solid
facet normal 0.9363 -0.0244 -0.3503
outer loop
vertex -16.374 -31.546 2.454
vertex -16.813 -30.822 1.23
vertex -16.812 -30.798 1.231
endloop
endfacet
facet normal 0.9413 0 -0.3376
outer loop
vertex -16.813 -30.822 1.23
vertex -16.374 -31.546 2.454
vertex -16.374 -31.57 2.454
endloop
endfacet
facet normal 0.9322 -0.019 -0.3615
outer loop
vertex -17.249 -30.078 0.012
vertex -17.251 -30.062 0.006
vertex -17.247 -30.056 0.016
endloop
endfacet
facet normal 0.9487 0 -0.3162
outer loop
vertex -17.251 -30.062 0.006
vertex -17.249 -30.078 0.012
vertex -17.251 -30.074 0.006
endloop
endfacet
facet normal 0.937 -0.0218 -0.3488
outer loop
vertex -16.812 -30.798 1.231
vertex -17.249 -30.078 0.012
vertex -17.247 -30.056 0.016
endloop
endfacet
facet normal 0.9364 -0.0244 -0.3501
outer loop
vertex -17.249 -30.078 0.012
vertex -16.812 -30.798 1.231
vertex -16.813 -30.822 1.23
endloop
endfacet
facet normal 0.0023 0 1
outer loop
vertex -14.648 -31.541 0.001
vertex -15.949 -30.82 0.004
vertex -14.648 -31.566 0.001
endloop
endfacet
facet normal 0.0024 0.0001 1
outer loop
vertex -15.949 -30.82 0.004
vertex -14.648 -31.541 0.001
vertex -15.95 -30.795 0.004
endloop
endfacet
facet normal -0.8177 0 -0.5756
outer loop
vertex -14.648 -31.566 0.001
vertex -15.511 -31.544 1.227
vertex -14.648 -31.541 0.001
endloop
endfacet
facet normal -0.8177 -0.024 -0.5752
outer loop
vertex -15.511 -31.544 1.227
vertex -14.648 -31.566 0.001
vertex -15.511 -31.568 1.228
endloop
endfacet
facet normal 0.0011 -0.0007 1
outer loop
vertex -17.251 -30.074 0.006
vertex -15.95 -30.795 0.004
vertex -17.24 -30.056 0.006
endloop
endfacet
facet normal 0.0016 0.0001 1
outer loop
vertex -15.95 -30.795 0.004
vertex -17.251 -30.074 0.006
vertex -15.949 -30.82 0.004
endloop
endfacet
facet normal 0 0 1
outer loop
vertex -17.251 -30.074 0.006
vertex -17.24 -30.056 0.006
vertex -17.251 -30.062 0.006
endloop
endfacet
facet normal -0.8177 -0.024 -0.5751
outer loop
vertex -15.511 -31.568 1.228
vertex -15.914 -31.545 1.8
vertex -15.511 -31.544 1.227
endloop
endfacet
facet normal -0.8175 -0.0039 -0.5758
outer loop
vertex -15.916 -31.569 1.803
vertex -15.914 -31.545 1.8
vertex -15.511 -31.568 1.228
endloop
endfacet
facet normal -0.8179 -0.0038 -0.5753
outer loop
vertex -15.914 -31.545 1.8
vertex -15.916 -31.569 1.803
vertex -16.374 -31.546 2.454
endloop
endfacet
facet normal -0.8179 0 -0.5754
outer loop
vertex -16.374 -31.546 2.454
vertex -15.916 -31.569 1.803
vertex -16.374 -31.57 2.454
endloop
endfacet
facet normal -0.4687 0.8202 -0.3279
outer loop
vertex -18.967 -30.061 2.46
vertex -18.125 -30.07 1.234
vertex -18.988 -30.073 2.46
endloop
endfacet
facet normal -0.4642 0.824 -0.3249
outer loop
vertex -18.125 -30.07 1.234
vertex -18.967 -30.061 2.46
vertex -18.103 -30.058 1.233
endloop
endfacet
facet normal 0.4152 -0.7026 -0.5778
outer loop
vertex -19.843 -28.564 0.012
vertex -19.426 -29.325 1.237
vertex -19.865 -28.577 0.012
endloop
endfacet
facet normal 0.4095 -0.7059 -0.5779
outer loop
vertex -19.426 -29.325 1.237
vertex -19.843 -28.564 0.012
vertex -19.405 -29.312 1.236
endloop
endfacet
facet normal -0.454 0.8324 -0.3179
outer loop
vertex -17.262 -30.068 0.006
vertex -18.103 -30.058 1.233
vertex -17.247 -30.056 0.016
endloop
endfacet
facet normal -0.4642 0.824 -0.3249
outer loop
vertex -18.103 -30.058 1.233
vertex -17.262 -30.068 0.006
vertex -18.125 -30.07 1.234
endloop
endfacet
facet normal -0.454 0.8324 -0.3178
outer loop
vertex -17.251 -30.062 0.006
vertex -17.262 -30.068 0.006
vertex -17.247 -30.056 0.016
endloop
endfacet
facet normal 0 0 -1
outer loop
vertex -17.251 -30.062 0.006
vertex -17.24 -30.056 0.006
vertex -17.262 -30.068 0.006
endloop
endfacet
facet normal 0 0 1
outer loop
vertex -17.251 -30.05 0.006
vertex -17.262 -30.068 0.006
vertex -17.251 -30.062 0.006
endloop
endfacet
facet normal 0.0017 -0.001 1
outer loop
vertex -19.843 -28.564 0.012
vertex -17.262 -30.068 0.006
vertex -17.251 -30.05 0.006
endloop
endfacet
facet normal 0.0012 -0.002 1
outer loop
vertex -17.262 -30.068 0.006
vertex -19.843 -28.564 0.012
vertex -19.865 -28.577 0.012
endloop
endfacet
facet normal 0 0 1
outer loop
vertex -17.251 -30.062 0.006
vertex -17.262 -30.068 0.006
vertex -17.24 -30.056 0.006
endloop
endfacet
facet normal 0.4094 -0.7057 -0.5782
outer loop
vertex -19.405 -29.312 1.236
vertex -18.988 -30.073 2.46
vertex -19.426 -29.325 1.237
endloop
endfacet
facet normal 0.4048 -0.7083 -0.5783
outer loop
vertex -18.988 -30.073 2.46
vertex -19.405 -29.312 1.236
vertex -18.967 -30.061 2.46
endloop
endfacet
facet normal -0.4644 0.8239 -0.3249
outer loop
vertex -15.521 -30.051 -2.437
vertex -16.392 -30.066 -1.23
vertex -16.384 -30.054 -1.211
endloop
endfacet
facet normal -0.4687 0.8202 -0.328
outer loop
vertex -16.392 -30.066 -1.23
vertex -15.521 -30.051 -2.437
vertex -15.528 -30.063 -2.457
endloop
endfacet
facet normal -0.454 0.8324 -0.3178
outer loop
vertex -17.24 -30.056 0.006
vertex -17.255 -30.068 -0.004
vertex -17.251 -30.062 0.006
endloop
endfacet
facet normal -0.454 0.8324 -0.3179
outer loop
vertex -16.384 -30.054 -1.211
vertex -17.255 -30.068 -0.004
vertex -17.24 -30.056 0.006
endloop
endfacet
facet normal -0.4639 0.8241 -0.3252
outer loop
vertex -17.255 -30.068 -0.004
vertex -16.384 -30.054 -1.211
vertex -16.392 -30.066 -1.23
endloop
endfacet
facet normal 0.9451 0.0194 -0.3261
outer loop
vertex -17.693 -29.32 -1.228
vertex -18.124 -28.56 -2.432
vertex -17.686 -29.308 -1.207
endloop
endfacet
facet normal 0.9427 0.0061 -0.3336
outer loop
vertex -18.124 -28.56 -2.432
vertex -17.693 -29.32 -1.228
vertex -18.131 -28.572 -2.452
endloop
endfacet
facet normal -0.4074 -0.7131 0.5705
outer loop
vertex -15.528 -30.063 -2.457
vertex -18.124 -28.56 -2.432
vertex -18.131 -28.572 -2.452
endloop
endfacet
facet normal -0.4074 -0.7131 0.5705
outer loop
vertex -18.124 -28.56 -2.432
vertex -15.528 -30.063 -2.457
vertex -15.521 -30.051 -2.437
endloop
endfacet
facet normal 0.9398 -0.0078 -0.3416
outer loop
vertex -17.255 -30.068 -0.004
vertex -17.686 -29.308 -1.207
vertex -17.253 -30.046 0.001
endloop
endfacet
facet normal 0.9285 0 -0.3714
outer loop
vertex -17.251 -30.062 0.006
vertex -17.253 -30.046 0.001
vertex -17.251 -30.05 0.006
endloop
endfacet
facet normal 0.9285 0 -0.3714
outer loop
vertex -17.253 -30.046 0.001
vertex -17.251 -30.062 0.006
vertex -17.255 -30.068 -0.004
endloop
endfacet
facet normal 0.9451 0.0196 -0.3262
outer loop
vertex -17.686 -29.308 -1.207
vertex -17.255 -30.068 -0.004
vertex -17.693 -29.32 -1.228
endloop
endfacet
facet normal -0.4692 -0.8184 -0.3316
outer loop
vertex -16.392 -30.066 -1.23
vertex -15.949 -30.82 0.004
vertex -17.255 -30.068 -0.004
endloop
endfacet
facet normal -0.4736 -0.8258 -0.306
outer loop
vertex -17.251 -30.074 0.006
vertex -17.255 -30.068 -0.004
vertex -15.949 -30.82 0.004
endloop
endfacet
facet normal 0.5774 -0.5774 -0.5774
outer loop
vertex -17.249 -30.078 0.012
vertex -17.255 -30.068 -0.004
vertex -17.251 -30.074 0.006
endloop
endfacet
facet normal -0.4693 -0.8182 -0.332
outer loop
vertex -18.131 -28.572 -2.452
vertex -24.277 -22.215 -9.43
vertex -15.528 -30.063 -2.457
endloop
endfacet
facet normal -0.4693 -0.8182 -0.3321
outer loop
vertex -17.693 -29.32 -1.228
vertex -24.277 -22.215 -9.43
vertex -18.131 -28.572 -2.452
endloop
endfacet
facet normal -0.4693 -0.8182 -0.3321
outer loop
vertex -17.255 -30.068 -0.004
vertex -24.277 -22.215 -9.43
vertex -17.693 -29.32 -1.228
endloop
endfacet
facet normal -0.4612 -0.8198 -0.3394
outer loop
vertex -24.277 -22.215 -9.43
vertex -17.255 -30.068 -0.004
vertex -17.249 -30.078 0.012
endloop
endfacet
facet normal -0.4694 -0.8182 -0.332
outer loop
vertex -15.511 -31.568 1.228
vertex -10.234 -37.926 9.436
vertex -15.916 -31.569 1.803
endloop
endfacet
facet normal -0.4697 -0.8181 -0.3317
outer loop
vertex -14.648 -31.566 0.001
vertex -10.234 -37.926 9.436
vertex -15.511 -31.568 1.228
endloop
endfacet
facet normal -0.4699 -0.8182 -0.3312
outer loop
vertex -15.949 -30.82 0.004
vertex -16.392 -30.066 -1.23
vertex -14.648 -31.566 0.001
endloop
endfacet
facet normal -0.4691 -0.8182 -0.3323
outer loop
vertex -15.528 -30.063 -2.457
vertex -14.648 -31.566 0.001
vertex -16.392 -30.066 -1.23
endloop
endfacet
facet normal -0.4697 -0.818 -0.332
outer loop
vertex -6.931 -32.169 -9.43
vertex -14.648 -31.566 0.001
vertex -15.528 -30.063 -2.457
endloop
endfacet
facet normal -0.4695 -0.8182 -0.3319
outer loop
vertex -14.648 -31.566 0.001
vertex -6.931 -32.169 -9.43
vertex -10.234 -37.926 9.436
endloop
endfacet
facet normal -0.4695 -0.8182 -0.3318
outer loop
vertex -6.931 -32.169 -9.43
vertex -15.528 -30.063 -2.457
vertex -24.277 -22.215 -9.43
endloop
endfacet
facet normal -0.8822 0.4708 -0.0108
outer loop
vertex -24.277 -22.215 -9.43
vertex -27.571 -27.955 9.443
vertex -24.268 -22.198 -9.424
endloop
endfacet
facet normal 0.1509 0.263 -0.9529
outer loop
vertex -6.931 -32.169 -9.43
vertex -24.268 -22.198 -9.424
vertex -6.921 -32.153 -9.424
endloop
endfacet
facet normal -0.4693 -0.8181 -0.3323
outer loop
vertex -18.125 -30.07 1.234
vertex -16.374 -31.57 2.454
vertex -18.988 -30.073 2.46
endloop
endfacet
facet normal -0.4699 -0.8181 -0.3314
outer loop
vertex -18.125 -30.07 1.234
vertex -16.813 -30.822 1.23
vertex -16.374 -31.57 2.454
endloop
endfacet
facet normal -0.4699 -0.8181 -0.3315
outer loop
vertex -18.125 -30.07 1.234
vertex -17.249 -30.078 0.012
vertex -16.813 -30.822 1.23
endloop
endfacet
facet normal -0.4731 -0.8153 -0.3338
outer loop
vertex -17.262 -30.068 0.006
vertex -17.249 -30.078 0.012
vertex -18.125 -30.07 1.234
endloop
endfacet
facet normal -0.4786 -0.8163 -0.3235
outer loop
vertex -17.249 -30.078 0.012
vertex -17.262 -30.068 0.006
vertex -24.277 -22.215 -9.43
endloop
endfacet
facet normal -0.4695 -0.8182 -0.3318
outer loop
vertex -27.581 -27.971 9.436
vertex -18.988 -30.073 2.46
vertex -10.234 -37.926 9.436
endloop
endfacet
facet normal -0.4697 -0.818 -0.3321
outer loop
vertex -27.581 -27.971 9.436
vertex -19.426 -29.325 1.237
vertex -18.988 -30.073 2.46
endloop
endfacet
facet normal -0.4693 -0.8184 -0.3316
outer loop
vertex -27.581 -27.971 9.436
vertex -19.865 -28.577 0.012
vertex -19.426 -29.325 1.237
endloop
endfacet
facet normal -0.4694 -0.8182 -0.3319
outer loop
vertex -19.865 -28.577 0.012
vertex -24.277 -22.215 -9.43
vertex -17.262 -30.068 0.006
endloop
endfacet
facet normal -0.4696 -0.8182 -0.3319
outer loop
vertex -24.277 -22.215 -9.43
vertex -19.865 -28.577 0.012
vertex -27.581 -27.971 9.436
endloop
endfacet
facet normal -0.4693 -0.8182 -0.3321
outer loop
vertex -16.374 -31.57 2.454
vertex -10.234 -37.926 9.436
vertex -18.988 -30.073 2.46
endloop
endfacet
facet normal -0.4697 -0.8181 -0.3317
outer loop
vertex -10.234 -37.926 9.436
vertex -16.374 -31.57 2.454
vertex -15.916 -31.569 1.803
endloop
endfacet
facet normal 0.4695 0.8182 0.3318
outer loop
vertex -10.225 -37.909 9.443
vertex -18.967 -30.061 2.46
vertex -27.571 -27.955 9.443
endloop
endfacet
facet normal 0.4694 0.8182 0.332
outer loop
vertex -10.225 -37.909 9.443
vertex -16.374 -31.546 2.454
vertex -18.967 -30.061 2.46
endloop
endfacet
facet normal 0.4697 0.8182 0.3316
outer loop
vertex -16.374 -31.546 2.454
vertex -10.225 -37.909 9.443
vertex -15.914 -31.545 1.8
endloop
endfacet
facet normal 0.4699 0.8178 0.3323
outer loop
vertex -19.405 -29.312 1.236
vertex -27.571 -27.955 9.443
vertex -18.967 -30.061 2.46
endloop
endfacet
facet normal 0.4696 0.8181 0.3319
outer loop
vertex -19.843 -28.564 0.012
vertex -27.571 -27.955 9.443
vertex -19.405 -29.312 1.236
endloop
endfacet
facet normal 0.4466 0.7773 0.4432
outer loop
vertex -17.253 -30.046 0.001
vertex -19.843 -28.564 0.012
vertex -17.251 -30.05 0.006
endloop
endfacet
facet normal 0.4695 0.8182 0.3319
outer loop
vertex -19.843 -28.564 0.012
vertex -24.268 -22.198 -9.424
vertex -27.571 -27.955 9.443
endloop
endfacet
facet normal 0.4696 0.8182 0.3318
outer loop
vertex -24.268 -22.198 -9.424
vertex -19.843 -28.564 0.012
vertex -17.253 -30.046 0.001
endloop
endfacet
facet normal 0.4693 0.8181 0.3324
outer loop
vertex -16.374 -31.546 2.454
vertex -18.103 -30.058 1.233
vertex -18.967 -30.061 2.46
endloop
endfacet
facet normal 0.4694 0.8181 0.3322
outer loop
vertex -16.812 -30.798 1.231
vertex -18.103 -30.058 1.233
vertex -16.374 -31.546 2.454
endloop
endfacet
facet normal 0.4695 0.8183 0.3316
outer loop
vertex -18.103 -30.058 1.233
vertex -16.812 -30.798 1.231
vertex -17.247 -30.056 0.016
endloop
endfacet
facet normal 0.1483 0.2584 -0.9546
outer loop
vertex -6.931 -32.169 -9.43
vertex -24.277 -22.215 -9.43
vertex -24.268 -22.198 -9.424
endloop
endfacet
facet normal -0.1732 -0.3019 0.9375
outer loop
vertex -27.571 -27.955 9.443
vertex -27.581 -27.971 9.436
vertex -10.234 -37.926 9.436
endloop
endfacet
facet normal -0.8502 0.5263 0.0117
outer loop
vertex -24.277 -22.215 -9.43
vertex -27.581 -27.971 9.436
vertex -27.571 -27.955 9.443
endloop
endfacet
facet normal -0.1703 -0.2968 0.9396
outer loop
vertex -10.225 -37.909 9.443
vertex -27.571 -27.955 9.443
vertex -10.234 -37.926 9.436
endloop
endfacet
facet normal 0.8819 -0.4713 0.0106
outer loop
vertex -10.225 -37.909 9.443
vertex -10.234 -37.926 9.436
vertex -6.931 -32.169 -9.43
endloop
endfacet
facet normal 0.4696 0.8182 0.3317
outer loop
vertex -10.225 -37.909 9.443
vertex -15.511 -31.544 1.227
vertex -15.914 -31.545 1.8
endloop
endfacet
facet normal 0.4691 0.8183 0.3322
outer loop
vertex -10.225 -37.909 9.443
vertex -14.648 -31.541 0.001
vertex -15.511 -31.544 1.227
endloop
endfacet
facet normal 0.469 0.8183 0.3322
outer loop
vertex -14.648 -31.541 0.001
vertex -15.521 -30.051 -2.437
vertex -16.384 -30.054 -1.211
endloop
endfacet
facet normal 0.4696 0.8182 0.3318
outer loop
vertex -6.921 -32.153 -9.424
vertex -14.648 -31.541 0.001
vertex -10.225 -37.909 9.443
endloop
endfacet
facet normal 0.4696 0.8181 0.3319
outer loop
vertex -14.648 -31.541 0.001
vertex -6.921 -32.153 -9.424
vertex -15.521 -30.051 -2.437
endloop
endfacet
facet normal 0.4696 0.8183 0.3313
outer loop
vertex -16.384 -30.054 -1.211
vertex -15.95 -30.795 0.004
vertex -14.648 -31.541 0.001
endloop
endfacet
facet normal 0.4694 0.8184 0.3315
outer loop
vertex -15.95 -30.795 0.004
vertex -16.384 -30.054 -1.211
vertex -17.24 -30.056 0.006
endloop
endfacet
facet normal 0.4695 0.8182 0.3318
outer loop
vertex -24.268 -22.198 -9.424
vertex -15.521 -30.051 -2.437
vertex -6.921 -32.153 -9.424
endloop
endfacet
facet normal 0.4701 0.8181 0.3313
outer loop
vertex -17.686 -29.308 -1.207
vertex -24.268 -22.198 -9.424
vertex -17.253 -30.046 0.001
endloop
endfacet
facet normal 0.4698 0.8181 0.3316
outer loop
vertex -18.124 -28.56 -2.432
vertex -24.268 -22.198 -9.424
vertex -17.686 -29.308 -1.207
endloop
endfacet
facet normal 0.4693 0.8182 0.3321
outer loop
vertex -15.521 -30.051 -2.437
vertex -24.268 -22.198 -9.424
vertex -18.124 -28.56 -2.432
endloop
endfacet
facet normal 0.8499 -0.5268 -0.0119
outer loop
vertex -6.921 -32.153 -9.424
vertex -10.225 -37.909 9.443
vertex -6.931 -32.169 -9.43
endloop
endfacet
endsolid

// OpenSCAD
// file: PolyhedronOutlinerLib.scad
//====================================
// Utility functions adapted from 
// http://www.thingiverse.com/thing:11071
//====================================

function VMAG(v) = sqrt(v[0]*v[0]+v[1]*v[1]+v[2]*v[2]); 

function LineRotations(v) = [ 
	atan2(sqrt(v[0]*v[0]+v[1]*v[1]), v[2]), 
	0, 
	atan2(v[1], v[0])+90];

function parseSeg(seg) = [ 
	seg[0], 
	LineRotations(seg[1]-seg[0]), 
	VMAG(seg[1]-seg[0])
	];


module PlaceLine(seg, r=1, l = 10, type=1) 
{
	smoothness = 16;
	diameter = r*2;
	side = sqrt((diameter*diameter)/2);

	params = parseSeg(seg);

	origin = params[0];
	rot = params[1];
	len = params[2];

	translate(origin)
	rotate(rot)
	{
		if (type == 1)
		{
			rotate([0,0, 360]) cylinder(r=r, h=len, $fn=smoothness);

		} 
		if (type == 2)
		{
			translate([0,0,l/2]) cube([r,r,l], center=true);
		} 
		if (type == 3)
		{
			cube([r,r,2*l], center=true);
		}
	}
}
// main file
/* based on three.js - STL loader test by aleeper. PR2 head from www.ros.org */
  
use <PolyhedronOutlinerLib.scad>;sR=1.5; sL = 6; cR=20; cL=0.01; %mainShape(); /* vertex: 0*/ intersection() { *mainShape(); difference() {PlaceLine([[-17.251,-30.062,0.00642054],[-17.657609390412986,-30.7705658206549,-0.2809850389512841]],r=cR,l=cL,type=3); #union() {polyhedron(points = [[-17.15230004897041,-60.06183511545164,0.018723603895781465],[-14.549312809088669,-61.553277579841534,0.013108190559026966],[-16.27547921587434,-61.557953872791266,2.4667450835490974],[-17.349699951029592,-0.06216488454835911,-0.005882523895781466],[-14.74671271114785,-1.5536073489382503,-0.011497937232535966],[-16.472879117933523,-1.558283641887979,2.4421389557575344]], triangles = [[1,0,2], [3,4,5], [1, 4, 3], [0, 1, 3], [3, 5, 2], [0, 3, 2], [5, 4, 2], [2, 4, 1]], convexity = 10); polyhedron(points = [[-43.18217244778782,-45.14741047155273,0.07487773726332647],[-44.90833885457349,-45.152086764502464,2.5285146302533974],[-45.78515968766956,-43.65596800716284,0.08049315060008097],[8.680172447787818,-14.97658952844727,-0.06203665726332647],[6.954006041002148,-14.981265821396999,2.3916002357267443],[6.077185207906077,-13.48514706405738,-0.05642124392657197]], triangles = [[1,0,2], [3,4,5], [1, 4, 3], [0, 1, 3], [3, 5, 2], [0, 3, 2], [5, 4, 2], [2, 4, 1]], convexity = 10); polyhedron(points = [[-25.920508379931114,-45.10064754205544,-24.46149119263738],[-26.797329213027183,-43.60452878471582,-26.909512672290695],[-24.194341973145445,-45.09597124910571,-26.91512808562745],[-8.581491620068887,-15.02335245794456,24.47433227263738],[-9.458312453164957,-13.52723370060494,22.026310792984063],[-6.8553252132832165,-15.018676164994831,22.020695379647307]], triangles = [[1,0,2], [3,4,5], [1, 4, 3], [0, 1, 3], [3, 5, 2], [0, 3, 2], [5, 4, 2], [2, 4, 1]], convexity = 10); }}}module mainShape() {polyhedron(points = [[-17.251,-30.062,0.00642054], [-17.4484,29.9377,-0.0181856], [34.6114,0.108853,-0.130494], [0.0880366,0.0153295,48.9423]], triangles = [[0,1,2], [3,2,1], [0,3,1], [0,2,3]], convexity = 10);}
